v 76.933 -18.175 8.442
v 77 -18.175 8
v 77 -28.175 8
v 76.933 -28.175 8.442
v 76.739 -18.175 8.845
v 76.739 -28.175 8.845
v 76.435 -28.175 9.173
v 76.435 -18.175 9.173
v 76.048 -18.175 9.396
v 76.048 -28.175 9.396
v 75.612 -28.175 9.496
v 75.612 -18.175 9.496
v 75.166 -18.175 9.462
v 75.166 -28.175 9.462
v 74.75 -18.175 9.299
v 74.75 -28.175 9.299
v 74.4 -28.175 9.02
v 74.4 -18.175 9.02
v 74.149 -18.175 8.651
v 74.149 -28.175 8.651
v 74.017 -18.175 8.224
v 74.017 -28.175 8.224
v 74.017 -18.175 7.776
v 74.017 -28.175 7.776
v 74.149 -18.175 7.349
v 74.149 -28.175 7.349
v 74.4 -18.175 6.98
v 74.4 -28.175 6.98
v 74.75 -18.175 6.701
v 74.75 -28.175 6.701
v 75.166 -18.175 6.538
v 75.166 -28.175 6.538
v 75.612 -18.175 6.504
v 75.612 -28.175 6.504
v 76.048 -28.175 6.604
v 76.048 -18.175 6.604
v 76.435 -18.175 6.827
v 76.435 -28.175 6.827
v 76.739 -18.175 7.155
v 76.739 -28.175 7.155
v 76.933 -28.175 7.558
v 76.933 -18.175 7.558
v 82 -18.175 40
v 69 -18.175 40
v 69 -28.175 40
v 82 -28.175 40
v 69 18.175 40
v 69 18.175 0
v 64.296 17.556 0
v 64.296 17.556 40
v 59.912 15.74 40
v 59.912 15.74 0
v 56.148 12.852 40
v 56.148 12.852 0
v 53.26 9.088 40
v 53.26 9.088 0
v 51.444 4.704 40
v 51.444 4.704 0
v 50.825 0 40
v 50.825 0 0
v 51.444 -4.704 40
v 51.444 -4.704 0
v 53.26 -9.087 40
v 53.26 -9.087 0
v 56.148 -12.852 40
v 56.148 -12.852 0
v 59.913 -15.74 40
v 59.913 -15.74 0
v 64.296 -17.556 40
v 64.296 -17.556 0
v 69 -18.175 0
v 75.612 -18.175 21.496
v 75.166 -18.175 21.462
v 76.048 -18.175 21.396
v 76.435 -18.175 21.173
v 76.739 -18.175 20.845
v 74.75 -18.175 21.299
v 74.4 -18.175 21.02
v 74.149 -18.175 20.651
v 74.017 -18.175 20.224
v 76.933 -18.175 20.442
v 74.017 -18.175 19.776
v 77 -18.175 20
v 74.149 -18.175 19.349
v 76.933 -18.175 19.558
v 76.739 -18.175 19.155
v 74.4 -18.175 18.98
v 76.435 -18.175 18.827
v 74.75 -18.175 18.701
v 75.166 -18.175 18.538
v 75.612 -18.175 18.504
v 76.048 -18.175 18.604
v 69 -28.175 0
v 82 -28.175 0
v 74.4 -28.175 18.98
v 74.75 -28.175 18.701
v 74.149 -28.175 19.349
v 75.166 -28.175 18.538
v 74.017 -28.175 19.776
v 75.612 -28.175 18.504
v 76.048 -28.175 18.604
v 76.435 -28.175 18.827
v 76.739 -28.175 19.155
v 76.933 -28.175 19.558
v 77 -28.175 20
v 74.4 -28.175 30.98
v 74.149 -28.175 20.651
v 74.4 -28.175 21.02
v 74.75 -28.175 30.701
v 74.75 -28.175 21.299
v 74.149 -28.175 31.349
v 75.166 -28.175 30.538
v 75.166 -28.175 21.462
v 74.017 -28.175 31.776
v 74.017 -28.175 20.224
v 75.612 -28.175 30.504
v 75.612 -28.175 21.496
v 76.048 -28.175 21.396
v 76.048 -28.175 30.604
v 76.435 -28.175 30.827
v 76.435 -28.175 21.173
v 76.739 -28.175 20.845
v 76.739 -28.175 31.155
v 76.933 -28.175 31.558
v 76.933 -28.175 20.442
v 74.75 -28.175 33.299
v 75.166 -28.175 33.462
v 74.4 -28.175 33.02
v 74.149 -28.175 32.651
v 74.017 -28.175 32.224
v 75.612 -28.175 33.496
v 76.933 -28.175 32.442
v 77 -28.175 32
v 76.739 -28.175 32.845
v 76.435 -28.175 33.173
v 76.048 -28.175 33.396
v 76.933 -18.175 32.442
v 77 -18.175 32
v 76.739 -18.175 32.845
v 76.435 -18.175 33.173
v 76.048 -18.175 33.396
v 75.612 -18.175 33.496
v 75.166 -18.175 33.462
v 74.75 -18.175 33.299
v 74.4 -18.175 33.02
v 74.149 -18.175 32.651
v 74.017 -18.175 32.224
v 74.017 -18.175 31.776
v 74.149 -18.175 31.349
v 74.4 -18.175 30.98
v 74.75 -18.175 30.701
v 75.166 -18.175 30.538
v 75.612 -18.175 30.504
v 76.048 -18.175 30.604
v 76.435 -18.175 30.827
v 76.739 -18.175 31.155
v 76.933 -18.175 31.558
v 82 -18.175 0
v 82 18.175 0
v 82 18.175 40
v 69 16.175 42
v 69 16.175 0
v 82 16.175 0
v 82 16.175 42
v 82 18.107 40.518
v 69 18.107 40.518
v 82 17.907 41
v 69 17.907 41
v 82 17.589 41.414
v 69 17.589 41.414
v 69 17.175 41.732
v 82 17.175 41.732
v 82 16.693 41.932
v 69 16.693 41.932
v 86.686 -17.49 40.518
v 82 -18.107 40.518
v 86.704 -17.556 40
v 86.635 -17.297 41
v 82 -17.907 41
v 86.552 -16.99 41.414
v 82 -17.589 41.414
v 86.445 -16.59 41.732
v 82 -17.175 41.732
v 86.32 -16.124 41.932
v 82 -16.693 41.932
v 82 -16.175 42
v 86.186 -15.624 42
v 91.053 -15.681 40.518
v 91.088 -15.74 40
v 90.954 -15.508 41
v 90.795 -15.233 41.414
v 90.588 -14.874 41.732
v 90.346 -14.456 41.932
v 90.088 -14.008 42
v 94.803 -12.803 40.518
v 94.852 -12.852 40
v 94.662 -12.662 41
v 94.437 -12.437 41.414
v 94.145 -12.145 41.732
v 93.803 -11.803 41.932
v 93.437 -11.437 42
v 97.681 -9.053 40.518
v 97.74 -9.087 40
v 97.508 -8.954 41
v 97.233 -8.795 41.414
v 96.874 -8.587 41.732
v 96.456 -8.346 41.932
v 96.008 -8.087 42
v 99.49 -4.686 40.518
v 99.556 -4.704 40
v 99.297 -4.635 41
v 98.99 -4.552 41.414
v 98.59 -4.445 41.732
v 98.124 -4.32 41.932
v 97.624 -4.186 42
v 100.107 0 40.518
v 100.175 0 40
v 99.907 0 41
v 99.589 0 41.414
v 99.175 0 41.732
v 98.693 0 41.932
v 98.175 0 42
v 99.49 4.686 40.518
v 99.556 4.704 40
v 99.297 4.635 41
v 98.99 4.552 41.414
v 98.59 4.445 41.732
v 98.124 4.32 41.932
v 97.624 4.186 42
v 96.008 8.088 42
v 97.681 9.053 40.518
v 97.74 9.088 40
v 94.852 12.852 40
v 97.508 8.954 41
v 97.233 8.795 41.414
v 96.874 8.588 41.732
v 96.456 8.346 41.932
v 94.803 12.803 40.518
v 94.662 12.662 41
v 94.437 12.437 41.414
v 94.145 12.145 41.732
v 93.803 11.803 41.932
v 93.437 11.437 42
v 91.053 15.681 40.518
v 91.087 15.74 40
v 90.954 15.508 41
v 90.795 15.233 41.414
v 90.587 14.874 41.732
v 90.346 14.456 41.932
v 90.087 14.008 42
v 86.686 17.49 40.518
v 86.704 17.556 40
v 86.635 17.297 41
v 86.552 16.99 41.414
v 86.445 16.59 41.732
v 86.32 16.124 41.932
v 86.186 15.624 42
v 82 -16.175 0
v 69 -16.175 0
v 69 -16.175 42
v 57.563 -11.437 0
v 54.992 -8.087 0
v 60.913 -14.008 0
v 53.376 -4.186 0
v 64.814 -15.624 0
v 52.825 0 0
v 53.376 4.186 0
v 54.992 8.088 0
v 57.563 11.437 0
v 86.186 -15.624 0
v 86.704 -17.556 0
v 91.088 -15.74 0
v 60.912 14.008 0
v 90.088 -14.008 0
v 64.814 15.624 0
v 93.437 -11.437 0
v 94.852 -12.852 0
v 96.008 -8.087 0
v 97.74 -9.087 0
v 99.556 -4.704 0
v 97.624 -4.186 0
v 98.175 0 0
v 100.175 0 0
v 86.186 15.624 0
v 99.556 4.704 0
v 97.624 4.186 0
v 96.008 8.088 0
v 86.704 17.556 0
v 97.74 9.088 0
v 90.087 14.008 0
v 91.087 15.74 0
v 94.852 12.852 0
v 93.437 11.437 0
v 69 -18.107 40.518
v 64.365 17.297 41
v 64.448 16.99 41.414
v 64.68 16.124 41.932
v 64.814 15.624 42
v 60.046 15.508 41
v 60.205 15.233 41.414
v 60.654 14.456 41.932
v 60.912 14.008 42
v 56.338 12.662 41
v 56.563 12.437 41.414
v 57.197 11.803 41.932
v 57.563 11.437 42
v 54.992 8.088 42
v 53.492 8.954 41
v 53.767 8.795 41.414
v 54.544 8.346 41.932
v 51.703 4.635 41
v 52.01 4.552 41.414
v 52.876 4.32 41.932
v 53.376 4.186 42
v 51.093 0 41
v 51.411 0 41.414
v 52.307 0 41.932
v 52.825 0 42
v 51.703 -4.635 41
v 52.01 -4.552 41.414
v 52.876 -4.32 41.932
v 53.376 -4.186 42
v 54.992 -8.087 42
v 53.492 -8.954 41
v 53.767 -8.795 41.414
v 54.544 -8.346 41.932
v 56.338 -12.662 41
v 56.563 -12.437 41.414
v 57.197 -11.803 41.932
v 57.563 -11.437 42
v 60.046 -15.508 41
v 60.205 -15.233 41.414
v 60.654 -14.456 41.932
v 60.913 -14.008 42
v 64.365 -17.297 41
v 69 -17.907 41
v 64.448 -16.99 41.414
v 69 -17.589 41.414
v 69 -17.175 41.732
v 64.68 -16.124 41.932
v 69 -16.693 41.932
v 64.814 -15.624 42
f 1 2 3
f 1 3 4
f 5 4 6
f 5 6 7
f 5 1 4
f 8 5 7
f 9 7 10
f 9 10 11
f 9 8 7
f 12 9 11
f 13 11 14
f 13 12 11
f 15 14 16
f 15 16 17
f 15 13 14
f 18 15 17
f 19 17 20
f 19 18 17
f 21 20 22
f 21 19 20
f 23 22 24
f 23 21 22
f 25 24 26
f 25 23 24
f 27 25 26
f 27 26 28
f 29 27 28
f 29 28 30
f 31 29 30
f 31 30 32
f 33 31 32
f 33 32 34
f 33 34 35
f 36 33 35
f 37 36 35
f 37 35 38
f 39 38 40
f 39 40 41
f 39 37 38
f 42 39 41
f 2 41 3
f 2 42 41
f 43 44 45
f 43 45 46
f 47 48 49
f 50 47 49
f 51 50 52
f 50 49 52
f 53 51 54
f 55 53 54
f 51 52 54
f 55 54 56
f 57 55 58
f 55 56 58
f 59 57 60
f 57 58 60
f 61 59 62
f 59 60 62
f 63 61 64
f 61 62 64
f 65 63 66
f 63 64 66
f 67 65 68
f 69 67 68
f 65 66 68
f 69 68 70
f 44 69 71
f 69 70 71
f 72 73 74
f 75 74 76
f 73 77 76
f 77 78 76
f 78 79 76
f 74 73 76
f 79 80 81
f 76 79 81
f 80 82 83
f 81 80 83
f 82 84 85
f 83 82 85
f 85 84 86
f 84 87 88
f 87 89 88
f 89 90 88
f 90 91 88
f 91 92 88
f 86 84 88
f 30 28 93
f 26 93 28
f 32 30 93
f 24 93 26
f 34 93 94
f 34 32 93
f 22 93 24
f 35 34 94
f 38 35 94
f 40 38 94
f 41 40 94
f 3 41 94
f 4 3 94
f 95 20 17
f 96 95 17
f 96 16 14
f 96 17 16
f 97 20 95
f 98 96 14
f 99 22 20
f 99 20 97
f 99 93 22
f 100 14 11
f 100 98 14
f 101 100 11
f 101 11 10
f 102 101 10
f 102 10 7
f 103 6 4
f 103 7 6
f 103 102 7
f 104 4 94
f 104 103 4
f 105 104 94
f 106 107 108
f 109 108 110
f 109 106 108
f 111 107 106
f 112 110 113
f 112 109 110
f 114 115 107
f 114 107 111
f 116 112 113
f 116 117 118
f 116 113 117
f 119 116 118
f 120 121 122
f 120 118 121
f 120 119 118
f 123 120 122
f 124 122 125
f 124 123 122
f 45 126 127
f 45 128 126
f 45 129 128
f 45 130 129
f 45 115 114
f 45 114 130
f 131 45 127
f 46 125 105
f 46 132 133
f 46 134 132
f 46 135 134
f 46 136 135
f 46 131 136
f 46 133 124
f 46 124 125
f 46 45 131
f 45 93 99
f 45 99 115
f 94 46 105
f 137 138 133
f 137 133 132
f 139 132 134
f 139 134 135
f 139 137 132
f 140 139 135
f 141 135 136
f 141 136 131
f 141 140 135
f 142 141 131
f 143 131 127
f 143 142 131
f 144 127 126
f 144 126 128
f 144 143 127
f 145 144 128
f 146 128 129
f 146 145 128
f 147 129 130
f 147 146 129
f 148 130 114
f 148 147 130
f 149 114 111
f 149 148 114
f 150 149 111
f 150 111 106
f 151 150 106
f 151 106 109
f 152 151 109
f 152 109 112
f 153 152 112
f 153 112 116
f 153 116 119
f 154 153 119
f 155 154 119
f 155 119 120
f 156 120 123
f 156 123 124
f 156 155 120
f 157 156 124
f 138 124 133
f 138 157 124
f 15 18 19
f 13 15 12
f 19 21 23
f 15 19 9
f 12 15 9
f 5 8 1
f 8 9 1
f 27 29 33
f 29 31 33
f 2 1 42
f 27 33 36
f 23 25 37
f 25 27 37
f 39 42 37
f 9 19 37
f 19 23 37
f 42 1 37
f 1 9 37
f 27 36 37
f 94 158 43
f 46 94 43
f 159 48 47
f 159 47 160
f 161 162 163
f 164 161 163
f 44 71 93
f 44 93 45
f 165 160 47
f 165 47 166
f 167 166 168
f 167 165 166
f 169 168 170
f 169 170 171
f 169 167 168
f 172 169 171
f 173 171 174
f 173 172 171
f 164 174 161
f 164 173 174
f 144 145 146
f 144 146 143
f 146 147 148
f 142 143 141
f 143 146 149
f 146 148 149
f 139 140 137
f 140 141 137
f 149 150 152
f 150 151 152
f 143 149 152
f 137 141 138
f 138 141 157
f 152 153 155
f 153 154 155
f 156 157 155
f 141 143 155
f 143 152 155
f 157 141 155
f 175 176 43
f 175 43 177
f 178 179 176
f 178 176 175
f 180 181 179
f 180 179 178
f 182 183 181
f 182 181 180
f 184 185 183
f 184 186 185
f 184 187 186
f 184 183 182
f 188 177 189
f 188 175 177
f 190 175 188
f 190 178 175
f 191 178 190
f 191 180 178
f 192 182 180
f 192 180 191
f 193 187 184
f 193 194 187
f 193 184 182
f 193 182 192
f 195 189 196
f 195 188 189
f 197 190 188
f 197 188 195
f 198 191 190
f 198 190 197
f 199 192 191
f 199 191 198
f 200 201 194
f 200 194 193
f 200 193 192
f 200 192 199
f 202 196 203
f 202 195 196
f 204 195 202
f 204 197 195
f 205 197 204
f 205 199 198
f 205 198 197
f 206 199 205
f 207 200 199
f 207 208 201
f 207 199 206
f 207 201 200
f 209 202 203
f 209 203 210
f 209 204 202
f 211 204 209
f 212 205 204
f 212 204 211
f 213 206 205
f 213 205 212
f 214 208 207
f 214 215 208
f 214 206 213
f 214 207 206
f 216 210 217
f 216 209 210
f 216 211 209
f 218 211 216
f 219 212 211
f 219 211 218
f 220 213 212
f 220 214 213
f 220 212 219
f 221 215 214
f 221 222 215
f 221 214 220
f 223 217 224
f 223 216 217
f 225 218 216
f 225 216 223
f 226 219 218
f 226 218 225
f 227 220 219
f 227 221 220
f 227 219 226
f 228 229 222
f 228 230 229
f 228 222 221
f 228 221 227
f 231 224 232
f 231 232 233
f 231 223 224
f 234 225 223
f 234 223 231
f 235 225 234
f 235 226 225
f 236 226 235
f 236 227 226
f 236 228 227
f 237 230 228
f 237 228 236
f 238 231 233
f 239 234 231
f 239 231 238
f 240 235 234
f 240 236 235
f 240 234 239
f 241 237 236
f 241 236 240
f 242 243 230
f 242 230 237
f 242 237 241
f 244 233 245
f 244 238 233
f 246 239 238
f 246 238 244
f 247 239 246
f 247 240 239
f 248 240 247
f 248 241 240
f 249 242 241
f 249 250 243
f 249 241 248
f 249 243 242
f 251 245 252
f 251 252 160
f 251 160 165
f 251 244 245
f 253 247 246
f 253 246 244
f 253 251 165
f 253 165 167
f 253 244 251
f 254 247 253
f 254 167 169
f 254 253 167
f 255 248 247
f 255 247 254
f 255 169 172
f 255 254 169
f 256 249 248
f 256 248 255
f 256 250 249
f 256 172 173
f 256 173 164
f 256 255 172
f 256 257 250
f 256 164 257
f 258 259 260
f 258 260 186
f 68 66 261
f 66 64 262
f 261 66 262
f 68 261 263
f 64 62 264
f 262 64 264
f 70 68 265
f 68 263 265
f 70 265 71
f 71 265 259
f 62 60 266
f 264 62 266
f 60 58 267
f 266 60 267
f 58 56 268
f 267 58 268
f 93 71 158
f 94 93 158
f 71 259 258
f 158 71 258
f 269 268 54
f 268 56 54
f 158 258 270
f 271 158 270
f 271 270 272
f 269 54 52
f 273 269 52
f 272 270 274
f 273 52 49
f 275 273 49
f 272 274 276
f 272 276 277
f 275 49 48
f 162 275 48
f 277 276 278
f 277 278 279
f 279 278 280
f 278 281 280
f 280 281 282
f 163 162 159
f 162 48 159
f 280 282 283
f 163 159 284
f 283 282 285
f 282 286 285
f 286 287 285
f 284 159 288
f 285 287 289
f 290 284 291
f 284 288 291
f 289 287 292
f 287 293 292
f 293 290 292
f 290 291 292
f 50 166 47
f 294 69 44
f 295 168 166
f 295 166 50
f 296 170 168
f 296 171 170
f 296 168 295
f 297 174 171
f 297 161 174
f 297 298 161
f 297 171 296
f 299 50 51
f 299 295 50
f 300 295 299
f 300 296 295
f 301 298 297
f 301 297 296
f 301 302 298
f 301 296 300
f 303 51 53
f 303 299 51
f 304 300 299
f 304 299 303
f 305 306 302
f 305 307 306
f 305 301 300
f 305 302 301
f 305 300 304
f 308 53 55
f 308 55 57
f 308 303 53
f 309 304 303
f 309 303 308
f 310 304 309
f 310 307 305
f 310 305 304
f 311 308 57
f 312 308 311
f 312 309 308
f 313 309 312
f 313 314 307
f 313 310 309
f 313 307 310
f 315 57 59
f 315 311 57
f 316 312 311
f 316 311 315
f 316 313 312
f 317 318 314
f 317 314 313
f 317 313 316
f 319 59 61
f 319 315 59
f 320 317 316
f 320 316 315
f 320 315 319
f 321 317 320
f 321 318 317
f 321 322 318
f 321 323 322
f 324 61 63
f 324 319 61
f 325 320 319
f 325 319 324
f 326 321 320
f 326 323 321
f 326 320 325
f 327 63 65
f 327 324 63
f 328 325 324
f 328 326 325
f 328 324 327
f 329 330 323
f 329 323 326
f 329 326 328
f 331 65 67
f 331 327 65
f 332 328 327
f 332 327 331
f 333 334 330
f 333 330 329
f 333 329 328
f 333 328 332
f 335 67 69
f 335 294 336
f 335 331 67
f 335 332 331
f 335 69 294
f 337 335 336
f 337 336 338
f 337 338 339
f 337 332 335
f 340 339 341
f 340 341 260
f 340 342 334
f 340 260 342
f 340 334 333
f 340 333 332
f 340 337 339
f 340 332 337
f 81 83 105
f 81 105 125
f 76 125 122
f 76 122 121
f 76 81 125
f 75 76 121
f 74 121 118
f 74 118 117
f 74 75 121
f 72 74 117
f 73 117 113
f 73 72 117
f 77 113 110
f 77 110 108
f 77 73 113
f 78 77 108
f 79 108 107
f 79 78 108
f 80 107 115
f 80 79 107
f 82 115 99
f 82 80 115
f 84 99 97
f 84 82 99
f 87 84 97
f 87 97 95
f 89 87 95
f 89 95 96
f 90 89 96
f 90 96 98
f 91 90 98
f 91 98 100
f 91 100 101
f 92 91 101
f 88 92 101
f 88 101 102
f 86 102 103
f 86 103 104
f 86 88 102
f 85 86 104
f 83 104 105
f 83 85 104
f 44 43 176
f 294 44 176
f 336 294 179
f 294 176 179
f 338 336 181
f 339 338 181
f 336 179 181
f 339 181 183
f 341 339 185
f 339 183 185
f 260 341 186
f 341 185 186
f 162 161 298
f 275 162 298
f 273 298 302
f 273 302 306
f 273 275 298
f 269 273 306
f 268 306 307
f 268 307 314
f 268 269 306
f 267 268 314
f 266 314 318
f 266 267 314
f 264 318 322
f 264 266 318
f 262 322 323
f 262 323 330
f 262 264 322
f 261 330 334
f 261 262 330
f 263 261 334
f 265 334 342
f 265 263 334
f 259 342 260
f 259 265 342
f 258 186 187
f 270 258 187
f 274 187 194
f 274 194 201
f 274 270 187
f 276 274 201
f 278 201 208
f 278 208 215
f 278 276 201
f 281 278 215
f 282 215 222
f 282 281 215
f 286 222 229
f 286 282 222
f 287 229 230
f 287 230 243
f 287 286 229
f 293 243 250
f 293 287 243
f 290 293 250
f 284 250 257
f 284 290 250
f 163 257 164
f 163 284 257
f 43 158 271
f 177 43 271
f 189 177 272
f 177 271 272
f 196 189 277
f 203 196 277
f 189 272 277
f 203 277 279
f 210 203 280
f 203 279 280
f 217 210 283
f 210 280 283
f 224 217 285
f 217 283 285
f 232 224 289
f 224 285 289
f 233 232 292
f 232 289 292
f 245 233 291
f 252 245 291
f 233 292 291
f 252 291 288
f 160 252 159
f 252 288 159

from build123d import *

# Parameters (mm, degrees)
PAD005_DEPTH    = 40
THICKNESS001_T  = 2
POCKET001_DEPTH = 5
SKETCH006_W     = 13
SKETCH006_H     = 40
SKETCH006_R     = 1.5
PAD006_DEPTH    = 10


with BuildPart() as part:
    # Sketch005 → Pad005 (new body)
    with BuildSketch(Plane.XY):
        with BuildLine():
            ThreePointArc((0, 16.175), (-16.175, 0), (0, -16.175))
            Line((0, -16.175), (13, -16.175))
            ThreePointArc((13, -16.175), (29.175, 0), (13, 16.175))
            Line((0, 16.175), (13, 16.175))
        make_face()
    extrude(amount=PAD005_DEPTH)

    # Thickness001
    thickness001_openings = [part.faces().sort_by_distance(p)[0] for p in [
        (6.5, 0, 0),
    ]]
    offset(amount=THICKNESS001_T, openings=thickness001_openings)

    # Thickness001 Face5 → Pocket001 (cut)
    with BuildSketch(Plane(origin=(6.5, 0, 40), x_dir=(0, -1, 0), z_dir=(0, 0, -1))):
        with BuildLine():
            ThreePointArc((16.175, 6.5), (0, 22.675), (-16.175, 6.5))
            Line((-16.175, 6.5), (-16.175, -6.5))
            ThreePointArc((-16.175, -6.5), (0, -22.675), (16.175, -6.5))
            Line((16.175, -6.5), (16.175, 6.5))
        make_face()
    extrude(amount=-POCKET001_DEPTH, mode=Mode.SUBTRACT)

    # Sketch006 (on Face12 of Pocket001) → Pad006 (join)
    with BuildSketch(Plane.XZ.offset(18.175)):
        with Locations((6.5, 20)):
            Rectangle(SKETCH006_W, SKETCH006_H)
        with Locations((6.5, 32)):
            Circle(SKETCH006_R, mode=Mode.SUBTRACT)
        with Locations((6.5, 20)):
            Circle(SKETCH006_R, mode=Mode.SUBTRACT)
        with Locations((6.5, 8)):
            Circle(SKETCH006_R, mode=Mode.SUBTRACT)
    extrude(amount=PAD006_DEPTH)


with BuildPart() as part_1:
    # Body002 placement: moved
    add(part.part.moved(Location((69, 0, 0))))


solid = part_1.part
